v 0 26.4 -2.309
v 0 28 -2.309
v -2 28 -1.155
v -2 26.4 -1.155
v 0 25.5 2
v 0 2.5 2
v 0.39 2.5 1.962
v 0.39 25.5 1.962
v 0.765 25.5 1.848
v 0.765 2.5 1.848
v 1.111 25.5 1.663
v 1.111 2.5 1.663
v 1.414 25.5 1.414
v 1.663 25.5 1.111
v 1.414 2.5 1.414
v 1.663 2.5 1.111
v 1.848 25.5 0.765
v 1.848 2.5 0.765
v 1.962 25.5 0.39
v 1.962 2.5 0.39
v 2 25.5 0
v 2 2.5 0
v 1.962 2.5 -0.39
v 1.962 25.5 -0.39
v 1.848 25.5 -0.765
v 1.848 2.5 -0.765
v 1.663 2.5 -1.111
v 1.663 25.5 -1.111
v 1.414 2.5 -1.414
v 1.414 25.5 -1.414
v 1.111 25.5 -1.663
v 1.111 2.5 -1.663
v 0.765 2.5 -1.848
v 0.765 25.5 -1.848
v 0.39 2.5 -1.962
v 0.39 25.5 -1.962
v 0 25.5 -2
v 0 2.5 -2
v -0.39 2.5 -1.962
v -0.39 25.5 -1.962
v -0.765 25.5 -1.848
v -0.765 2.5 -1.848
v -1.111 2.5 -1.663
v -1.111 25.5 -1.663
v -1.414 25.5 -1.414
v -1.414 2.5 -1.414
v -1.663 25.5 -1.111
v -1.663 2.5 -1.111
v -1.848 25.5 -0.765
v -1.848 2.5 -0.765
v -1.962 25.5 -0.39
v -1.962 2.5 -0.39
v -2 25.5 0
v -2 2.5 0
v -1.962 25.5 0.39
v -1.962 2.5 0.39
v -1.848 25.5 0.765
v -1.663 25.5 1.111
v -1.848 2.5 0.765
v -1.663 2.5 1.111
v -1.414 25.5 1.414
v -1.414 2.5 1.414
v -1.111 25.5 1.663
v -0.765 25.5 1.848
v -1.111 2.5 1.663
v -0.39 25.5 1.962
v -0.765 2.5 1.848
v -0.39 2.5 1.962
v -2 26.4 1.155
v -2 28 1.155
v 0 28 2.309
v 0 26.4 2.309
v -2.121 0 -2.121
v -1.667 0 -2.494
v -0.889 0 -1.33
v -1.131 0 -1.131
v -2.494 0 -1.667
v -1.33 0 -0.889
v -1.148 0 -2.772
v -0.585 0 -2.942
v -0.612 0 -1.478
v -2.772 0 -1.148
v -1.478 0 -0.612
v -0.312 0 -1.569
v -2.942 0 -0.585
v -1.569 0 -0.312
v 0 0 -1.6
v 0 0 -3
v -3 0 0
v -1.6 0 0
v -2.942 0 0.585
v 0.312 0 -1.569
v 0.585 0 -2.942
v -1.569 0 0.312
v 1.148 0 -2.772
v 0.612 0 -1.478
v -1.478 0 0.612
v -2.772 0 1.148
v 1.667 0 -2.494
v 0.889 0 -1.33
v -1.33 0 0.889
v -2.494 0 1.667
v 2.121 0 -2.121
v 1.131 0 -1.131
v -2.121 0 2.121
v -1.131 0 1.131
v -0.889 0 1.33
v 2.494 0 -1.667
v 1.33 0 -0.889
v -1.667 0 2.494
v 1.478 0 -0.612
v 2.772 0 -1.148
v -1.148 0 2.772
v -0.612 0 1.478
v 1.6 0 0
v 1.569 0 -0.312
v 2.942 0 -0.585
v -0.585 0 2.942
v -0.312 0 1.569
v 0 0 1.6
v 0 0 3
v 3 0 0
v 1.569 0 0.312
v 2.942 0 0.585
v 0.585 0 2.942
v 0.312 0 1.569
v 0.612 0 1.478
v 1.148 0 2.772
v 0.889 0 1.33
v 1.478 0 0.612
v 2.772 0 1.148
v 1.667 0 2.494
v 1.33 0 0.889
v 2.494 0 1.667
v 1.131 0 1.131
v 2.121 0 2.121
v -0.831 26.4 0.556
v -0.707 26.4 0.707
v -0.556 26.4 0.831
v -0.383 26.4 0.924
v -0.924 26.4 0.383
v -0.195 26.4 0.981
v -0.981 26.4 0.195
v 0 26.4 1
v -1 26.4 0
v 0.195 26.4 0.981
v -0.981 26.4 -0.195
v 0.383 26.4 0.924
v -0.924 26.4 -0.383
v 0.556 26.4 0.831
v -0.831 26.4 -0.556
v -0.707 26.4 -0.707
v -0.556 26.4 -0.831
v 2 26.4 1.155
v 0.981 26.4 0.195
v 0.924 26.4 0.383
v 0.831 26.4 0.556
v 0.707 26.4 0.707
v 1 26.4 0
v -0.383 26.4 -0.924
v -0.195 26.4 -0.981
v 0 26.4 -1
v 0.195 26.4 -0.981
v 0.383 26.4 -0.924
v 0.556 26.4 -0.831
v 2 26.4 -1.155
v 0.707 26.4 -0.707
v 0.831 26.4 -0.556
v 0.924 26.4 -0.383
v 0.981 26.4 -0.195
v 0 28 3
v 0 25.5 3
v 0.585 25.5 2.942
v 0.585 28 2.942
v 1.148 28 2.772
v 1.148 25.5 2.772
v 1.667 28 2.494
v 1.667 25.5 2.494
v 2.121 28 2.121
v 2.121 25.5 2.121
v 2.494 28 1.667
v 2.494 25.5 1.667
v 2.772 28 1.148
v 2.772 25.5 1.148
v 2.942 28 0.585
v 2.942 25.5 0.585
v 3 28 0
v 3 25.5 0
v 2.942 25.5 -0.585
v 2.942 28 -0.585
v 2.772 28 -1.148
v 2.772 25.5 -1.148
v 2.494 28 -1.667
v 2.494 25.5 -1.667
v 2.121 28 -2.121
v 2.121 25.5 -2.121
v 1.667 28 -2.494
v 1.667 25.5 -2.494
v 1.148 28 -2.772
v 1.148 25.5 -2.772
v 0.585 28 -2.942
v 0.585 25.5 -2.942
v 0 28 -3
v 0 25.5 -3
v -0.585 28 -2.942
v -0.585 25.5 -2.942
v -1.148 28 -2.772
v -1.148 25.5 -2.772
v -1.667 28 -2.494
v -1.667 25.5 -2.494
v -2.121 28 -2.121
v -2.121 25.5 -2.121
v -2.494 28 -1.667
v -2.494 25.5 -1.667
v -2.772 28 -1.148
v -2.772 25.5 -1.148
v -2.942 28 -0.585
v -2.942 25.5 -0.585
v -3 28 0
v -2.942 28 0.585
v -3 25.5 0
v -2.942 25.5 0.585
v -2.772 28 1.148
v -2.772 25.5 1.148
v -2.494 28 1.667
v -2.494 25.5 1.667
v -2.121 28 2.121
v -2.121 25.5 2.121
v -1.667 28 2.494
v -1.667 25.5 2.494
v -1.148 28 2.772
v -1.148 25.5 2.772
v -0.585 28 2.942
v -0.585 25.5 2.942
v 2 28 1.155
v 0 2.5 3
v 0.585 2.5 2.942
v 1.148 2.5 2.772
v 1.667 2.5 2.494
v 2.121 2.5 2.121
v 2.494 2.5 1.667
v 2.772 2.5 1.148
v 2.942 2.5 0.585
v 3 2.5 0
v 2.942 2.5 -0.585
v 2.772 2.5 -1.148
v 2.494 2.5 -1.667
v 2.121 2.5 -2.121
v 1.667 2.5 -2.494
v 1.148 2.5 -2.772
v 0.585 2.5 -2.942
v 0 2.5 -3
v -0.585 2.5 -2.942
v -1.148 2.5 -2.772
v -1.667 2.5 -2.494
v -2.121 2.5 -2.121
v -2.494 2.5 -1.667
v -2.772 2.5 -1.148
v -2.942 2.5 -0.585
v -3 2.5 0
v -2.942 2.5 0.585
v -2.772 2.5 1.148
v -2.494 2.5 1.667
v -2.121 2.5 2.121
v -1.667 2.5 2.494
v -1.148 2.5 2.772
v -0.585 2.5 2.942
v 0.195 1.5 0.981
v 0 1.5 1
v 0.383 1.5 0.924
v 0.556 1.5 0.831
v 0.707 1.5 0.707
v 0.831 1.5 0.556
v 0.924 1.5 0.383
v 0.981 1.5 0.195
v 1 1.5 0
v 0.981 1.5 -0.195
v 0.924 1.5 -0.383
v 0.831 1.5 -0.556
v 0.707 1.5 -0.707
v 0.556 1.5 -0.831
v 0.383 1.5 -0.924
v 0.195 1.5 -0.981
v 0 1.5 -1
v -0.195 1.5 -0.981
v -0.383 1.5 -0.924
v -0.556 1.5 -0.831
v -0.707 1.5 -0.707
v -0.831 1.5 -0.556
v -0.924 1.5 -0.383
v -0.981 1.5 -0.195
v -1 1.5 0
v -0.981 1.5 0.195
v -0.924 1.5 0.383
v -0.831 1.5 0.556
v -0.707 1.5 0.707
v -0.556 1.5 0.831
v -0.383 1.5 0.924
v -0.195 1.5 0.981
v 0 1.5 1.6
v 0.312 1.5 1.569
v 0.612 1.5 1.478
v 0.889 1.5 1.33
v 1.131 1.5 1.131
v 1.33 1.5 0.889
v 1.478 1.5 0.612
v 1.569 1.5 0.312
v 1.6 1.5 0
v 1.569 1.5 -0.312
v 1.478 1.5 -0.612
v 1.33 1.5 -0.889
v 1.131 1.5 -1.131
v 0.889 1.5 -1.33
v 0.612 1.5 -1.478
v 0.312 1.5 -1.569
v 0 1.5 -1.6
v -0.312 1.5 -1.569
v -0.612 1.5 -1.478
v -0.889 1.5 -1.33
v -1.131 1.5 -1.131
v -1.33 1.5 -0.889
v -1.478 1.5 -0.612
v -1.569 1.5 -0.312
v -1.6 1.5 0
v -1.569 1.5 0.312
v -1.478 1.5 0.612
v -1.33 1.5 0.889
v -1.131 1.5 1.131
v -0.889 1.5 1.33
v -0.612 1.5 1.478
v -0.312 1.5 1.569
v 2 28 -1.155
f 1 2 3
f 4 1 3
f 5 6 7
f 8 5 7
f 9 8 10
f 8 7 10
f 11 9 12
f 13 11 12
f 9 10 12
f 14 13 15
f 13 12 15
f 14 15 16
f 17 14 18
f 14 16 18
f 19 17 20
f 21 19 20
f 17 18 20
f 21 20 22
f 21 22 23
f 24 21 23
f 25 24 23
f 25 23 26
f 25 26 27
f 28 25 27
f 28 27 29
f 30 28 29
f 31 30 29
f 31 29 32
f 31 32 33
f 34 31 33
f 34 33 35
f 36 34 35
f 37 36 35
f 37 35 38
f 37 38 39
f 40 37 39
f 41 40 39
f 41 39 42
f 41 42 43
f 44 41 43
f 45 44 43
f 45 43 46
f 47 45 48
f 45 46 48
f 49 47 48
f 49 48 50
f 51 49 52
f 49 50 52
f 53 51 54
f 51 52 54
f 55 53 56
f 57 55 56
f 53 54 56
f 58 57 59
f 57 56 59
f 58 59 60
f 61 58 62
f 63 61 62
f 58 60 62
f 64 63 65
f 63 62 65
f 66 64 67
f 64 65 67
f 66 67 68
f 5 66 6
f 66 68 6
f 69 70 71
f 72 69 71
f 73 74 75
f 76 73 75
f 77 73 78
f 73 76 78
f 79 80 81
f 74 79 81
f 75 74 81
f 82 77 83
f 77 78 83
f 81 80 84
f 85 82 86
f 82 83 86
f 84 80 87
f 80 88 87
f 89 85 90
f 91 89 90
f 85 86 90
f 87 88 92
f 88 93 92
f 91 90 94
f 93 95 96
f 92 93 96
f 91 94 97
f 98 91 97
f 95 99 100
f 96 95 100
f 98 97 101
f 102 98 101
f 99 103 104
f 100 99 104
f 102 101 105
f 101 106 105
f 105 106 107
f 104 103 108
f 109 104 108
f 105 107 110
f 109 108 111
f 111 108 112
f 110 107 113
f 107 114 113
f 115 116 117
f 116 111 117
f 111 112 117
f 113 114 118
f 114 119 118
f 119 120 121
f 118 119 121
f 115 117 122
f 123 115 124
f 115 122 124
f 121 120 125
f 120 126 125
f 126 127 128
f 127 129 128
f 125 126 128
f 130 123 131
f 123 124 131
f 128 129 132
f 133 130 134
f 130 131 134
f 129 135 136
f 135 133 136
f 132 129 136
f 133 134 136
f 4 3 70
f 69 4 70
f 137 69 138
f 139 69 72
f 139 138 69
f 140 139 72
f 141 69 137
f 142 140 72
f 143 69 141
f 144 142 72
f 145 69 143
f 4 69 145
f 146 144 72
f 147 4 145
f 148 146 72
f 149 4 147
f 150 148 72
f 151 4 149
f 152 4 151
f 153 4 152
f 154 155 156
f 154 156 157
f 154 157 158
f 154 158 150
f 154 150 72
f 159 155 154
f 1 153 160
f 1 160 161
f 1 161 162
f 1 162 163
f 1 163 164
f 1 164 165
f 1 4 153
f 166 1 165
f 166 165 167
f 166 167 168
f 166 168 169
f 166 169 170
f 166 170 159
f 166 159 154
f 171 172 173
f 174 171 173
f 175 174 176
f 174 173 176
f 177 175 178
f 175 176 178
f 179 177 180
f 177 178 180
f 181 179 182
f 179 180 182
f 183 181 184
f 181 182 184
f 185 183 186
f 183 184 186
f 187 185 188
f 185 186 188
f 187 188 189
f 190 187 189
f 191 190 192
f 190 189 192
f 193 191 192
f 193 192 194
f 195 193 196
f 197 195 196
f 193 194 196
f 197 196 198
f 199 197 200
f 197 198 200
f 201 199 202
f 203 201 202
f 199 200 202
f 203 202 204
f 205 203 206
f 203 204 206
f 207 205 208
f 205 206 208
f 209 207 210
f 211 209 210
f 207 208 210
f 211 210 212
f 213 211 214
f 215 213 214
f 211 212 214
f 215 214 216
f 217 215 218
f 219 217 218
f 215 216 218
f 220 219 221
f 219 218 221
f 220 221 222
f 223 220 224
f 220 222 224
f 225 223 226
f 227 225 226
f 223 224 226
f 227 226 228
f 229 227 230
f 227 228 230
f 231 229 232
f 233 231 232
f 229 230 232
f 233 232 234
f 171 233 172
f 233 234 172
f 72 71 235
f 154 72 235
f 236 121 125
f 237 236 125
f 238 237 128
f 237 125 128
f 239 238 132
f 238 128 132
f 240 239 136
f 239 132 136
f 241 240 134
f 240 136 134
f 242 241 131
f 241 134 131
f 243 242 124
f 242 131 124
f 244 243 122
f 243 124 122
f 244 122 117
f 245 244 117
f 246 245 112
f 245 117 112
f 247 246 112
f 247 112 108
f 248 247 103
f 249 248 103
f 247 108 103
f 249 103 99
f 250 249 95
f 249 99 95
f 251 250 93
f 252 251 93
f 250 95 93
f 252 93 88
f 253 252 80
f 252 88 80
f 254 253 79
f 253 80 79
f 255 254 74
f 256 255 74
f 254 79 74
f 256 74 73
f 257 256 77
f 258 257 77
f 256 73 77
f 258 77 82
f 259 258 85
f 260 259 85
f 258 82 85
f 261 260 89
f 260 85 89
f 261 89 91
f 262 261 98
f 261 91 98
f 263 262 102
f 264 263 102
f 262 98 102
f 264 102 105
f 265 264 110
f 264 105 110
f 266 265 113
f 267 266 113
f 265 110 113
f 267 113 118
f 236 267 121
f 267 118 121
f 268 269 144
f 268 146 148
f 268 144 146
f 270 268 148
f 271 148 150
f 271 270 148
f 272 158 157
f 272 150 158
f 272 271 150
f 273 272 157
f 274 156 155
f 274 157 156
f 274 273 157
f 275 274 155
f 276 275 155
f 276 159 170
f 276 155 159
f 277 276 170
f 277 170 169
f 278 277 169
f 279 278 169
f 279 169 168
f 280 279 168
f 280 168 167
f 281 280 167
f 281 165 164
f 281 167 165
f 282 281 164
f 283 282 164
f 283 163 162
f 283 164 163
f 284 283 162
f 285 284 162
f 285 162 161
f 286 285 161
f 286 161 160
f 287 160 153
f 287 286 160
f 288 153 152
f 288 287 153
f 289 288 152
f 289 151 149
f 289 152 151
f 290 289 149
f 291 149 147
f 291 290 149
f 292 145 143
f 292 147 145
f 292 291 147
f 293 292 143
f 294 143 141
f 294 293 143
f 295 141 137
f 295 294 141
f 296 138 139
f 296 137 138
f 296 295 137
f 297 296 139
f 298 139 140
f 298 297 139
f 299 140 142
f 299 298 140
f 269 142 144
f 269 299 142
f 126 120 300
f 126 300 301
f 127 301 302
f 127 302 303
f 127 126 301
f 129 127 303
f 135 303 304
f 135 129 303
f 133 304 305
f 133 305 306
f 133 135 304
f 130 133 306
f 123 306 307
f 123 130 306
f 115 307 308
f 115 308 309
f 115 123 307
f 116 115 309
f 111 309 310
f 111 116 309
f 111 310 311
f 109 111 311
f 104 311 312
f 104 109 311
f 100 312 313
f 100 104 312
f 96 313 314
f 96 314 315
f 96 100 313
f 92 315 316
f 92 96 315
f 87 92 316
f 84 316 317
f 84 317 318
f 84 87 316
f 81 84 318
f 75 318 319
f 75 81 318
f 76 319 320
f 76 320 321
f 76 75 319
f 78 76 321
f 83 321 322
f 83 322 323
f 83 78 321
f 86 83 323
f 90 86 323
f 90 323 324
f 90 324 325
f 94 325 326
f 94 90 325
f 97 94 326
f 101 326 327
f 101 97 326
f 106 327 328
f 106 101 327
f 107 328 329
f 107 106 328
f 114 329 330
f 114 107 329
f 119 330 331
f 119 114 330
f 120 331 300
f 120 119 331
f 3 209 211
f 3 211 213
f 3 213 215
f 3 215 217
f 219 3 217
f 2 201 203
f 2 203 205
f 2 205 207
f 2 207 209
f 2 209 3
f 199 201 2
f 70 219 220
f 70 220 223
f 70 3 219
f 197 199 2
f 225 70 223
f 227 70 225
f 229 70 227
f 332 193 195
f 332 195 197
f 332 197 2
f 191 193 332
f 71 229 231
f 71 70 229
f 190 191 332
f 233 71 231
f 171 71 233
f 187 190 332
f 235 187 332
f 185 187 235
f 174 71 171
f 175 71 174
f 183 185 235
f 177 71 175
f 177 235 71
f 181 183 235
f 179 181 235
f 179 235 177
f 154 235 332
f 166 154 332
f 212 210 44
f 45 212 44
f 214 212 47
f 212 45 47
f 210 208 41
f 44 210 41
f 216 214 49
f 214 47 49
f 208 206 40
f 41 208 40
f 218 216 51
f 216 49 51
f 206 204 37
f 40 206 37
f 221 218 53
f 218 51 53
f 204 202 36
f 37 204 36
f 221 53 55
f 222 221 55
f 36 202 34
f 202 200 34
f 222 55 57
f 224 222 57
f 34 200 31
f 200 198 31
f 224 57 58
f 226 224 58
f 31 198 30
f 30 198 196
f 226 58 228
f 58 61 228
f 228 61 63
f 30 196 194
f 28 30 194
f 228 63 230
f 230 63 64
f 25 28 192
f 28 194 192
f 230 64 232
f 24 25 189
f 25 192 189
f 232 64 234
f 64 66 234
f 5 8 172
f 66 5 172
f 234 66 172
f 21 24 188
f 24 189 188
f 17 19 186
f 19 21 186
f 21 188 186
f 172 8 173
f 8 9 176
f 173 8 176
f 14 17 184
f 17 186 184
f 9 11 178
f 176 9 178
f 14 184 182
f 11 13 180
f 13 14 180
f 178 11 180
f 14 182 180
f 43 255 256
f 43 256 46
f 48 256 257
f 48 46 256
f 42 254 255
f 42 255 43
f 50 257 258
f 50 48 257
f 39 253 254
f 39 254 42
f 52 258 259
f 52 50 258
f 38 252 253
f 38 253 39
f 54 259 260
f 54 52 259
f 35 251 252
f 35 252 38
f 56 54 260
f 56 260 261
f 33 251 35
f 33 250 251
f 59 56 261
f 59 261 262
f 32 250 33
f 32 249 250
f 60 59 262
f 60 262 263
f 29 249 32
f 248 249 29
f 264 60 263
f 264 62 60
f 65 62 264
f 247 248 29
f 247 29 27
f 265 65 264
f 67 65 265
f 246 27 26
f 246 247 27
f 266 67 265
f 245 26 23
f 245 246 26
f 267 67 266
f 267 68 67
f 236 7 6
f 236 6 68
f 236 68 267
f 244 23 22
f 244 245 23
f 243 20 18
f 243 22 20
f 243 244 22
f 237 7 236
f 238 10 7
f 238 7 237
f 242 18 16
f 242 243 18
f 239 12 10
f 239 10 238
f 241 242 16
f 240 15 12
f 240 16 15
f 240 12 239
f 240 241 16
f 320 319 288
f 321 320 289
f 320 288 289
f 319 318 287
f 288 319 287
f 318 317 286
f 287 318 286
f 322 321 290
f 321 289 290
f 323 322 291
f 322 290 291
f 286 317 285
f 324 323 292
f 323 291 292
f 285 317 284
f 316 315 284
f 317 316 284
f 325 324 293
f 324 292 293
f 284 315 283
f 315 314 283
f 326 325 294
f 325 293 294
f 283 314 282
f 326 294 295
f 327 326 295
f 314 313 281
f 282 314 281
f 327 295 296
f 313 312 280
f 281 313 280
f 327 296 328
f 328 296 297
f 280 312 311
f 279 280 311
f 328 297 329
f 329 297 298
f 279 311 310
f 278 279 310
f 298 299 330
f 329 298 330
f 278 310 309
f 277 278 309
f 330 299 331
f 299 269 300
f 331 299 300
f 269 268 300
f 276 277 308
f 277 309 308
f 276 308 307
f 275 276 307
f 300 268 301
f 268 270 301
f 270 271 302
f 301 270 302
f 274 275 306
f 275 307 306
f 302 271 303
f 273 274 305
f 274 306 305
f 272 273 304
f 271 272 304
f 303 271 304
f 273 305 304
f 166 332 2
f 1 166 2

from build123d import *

# Parameters (mm, degrees)
SKETCH_1_R          = 2
SKETCH_1_R_2        = 1
EXTRUDE_1_DEPTH     = 28
SKETCH_2_R          = 3
SKETCH_2_R_2        = 2
EXTRUDE_2_DEPTH     = 2.5
EXTRUDE_START       = 25.5
SKETCH_3_R          = 3
SKETCH_3_R_2        = 2
EXTRUDE_3_DEPTH     = 2.5
SKETCH_4_R          = 1.6
CUT_EXTRUDE_1_DEPTH = 1.5
CUT_EXTRUDE_START   = 28
CUT_EXTRUDE_2_DEPTH = 1.6


with BuildPart() as part:
    # 草图1 → 凸台-拉伸1 (new body)
    with BuildSketch(Plane(origin=(0, 0, 0), x_dir=(1, 0, 0), z_dir=(0, 1, 0))):
        with Locations(Location((0, 0, 0), (0, 0, 270))):
            Circle(SKETCH_1_R)
        with Locations(Location((0, 0, 0), (0, 0, 270))):
            Circle(SKETCH_1_R_2, mode=Mode.SUBTRACT)
    extrude(amount=EXTRUDE_1_DEPTH)

    # 草图2 → 凸台-拉伸2 (add)
    with BuildSketch(Plane(origin=(0, 0, 0), x_dir=(1, 0, 0), z_dir=(0, 1, 0))):
        with Locations(Location((0, 0, 0), (0, 0, 270))):
            Circle(SKETCH_2_R)
        with Locations(Location((0, 0, 0), (0, 0, 270))):
            Circle(SKETCH_2_R_2, mode=Mode.SUBTRACT)
    extrude(amount=EXTRUDE_2_DEPTH)

    # 草图3 → 凸台-拉伸3 (add)
    with BuildSketch(Plane(origin=(0, 0, 0), x_dir=(1, 0, 0), z_dir=(0, 1, 0)).offset(EXTRUDE_START)):
        with Locations(Location((0, 0, 0), (0, 0, 270))):
            Circle(SKETCH_3_R)
        with Locations(Location((0, 0, 0), (0, 0, 270))):
            Circle(SKETCH_3_R_2, mode=Mode.SUBTRACT)
    extrude(amount=EXTRUDE_3_DEPTH)

    # 草图4 → 切除-拉伸1 (cut)
    with BuildSketch(Plane(origin=(0, 0, 0), x_dir=(1, 0, 0), z_dir=(0, 1, 0))):
        with Locations(Location((0, 0, 0), (0, 0, 270))):
            Circle(SKETCH_4_R)
    extrude(amount=CUT_EXTRUDE_1_DEPTH, mode=Mode.SUBTRACT)

    # 草图5 → 切除-拉伸2 (cut)
    with BuildSketch(Plane(origin=(0, 0, 0), x_dir=(1, 0, 0), z_dir=(0, 1, 0)).offset(CUT_EXTRUDE_START)):
        Polygon((0, -2.309401077), (2, -1.154700538), (2, 1.154700538), (0, 2.309401077), (-2, 1.154700538), (-2, -1.154700538), align=None)
    extrude(amount=-CUT_EXTRUDE_2_DEPTH, mode=Mode.SUBTRACT)


solid = part.part
